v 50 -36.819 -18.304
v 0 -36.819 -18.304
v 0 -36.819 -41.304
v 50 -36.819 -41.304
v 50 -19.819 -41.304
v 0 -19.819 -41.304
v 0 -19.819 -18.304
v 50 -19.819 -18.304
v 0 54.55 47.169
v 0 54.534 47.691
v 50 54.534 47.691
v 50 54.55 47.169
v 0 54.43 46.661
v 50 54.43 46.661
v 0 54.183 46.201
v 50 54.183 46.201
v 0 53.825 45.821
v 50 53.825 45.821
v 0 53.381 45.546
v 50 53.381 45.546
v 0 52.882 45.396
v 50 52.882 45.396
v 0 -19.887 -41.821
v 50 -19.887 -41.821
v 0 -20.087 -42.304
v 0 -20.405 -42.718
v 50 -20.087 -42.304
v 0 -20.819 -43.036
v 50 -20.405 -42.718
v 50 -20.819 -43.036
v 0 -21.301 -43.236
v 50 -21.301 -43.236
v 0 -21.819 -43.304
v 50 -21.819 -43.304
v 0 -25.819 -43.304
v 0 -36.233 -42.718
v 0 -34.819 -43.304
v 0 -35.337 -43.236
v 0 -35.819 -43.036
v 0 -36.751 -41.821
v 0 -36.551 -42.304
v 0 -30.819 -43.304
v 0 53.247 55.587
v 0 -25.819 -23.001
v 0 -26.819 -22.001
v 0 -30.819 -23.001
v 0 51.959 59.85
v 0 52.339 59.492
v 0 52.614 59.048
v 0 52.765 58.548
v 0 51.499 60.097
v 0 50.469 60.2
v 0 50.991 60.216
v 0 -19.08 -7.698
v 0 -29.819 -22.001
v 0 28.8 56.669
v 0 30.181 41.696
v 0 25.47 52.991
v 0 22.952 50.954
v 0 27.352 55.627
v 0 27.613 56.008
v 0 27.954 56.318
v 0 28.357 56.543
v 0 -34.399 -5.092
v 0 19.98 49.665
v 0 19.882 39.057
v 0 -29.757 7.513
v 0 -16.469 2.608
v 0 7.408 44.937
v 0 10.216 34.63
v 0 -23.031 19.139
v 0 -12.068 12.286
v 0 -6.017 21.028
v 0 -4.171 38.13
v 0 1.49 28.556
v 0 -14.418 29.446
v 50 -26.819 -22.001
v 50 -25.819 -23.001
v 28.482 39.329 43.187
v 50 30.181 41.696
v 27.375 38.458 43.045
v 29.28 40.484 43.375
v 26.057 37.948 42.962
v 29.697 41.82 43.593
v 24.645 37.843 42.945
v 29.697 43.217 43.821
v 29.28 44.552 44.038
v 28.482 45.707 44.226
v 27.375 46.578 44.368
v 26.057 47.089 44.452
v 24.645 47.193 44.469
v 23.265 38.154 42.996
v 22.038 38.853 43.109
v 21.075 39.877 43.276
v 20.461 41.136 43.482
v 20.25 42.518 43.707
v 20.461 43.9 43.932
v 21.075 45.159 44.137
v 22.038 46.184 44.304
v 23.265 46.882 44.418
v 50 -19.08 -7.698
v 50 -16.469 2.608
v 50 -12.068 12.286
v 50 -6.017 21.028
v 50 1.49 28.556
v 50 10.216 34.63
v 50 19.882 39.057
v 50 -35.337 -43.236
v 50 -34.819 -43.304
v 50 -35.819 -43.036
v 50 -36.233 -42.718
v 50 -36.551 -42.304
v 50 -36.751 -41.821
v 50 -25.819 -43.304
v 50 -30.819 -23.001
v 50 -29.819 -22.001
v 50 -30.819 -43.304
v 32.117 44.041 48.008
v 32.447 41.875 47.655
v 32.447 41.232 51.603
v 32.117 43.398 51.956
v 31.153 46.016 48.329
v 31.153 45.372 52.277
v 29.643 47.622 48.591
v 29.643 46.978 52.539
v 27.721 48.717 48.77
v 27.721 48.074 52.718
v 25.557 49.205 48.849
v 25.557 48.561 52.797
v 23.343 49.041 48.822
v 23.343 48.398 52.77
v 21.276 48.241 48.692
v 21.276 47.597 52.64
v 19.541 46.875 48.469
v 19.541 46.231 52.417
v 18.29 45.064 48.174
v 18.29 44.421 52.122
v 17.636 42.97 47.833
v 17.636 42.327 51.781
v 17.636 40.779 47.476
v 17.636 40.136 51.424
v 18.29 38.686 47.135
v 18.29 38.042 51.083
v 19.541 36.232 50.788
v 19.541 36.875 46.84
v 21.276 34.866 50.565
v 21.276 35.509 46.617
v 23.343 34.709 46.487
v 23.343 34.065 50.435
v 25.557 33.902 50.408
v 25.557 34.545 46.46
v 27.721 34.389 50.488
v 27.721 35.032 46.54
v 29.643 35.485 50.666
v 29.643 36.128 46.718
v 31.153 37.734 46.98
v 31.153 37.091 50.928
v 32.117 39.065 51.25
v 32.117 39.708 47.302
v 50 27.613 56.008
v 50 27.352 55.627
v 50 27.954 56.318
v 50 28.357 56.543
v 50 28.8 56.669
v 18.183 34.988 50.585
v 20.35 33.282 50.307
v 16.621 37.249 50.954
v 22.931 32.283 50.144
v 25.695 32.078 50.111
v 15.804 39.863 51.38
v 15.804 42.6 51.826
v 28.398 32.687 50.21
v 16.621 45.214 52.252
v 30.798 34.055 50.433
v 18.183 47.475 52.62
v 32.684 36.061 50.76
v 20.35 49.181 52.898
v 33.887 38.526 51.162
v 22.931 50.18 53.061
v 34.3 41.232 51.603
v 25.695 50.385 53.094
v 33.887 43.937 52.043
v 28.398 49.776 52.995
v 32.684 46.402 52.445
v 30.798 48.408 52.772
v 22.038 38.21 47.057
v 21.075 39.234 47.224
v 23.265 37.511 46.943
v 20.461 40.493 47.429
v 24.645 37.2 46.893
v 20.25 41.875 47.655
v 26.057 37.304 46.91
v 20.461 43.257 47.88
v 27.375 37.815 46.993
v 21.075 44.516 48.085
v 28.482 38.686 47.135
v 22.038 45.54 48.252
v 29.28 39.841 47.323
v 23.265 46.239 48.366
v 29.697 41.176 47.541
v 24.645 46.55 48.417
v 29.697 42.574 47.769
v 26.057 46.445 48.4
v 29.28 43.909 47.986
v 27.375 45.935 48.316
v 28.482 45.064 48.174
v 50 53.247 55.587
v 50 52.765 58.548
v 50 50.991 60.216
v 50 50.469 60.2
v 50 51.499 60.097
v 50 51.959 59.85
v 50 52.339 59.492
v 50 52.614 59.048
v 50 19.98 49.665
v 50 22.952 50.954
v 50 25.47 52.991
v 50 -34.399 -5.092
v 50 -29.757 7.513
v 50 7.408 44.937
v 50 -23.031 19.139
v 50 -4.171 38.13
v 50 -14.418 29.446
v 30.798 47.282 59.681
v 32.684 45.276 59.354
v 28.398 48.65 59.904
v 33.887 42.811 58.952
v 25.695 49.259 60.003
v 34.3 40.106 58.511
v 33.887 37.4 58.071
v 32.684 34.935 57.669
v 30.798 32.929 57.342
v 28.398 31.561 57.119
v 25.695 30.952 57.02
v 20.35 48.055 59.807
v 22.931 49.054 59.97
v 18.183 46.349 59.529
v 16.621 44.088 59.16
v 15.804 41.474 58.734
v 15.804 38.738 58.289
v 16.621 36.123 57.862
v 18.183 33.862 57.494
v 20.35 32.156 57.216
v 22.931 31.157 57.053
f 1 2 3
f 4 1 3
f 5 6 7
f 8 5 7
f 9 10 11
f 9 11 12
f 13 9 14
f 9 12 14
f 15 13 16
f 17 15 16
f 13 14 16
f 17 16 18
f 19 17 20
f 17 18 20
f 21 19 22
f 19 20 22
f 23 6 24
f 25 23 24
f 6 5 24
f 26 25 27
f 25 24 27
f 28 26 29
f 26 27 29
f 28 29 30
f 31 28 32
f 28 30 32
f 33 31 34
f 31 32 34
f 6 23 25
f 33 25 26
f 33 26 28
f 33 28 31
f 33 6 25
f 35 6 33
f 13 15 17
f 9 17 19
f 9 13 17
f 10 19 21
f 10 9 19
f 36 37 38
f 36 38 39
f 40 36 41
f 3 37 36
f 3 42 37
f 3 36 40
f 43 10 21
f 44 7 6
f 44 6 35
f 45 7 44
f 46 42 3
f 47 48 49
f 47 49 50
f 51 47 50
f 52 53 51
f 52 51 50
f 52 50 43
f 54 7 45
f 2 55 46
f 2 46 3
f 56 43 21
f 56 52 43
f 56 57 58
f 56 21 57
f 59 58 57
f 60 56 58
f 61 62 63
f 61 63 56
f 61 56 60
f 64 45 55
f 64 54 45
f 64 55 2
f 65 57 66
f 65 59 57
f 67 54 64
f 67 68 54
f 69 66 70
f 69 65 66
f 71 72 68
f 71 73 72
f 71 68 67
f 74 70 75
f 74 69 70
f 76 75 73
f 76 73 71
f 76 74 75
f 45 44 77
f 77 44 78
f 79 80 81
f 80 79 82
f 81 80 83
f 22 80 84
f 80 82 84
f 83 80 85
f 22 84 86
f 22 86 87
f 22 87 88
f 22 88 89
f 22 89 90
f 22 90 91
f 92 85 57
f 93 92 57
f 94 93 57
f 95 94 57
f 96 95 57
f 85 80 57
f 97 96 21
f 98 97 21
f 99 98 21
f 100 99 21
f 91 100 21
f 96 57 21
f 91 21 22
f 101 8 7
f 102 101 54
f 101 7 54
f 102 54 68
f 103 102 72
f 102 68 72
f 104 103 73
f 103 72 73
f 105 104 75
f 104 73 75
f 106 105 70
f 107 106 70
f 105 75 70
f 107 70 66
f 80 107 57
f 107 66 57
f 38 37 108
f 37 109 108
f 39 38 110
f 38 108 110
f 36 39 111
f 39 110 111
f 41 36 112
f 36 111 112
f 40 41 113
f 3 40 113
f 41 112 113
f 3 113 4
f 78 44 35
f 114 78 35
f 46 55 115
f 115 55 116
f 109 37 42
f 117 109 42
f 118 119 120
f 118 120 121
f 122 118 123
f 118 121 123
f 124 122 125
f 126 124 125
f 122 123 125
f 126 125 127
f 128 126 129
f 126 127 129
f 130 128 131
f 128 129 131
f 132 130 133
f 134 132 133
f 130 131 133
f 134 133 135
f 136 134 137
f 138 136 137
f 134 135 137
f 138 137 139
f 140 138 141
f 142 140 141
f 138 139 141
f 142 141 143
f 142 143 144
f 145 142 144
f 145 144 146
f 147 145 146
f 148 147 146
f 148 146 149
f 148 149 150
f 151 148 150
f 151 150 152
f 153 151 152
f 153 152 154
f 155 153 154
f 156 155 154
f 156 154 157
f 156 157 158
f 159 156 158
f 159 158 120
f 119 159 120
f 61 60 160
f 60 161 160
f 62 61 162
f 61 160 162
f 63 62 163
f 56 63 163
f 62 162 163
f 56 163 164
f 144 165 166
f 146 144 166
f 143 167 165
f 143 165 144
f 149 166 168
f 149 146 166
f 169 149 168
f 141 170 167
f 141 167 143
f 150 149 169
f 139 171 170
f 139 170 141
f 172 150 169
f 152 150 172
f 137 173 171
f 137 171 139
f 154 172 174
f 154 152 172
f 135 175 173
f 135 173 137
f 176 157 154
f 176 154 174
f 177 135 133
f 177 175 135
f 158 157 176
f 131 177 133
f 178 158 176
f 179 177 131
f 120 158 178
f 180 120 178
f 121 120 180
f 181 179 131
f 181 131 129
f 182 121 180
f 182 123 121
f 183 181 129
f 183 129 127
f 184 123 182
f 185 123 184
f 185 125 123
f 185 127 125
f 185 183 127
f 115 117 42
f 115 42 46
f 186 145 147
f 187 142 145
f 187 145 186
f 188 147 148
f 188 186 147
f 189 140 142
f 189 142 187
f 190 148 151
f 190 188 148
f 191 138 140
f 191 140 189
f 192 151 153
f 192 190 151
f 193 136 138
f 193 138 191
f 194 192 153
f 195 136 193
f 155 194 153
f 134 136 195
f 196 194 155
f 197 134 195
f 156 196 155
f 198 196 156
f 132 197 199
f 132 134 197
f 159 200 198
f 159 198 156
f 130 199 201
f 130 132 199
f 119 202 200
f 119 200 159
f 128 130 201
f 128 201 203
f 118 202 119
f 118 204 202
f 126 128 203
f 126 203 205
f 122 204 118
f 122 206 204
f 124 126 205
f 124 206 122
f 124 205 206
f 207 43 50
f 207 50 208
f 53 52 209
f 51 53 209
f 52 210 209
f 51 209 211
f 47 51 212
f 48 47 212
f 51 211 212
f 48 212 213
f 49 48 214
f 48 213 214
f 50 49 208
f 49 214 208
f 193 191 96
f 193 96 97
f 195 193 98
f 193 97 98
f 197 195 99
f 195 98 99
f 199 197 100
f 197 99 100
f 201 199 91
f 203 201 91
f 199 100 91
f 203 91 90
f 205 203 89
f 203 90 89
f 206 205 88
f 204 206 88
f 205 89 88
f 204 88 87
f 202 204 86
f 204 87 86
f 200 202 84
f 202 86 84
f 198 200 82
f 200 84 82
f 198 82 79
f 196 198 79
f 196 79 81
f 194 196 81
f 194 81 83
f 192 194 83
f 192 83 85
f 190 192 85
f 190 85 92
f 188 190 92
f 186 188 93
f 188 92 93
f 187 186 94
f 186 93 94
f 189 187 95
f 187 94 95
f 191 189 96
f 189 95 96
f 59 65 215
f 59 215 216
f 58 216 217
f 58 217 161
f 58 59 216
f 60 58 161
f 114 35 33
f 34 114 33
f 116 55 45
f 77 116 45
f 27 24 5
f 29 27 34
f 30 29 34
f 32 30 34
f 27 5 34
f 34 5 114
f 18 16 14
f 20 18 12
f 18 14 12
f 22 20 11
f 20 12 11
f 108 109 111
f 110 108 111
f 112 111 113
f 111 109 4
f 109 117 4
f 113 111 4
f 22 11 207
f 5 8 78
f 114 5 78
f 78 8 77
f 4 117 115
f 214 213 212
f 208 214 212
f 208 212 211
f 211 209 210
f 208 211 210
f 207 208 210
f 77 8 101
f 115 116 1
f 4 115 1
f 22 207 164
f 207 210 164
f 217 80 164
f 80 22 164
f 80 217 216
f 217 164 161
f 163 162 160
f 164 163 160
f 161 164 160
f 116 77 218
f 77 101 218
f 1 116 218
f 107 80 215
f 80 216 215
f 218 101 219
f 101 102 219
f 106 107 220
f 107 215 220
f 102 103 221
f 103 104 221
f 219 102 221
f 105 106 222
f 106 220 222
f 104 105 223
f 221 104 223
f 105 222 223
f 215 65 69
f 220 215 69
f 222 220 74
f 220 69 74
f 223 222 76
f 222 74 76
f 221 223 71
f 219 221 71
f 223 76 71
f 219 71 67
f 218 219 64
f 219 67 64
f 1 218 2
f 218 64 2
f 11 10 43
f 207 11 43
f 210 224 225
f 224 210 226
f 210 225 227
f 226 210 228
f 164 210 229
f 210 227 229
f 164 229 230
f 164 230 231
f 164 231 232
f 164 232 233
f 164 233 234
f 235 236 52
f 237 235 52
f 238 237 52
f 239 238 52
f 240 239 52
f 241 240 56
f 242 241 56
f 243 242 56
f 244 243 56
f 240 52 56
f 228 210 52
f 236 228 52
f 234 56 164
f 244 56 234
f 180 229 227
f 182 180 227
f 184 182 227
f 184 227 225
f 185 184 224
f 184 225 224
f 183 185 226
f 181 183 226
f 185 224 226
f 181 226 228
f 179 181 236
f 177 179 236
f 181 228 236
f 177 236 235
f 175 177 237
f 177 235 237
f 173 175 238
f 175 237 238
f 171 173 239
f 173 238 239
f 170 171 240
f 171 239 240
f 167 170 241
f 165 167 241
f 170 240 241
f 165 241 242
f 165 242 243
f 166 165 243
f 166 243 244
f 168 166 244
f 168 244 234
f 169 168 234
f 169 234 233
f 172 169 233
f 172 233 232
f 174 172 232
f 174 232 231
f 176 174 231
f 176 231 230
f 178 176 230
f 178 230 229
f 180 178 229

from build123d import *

# Parameters (mm, degrees)
F1_DEPTH       = 50
F2_DEPTH       = 5
F4_D           = 9.5
F4_CBORE_D     = 18.6
F4_CBORE_DEPTH = 7
F5_T1_DEPTH    = 50
F6_R           = 2
F7_R           = 2
F8_R           = 2
F9_R           = 2
F10_R          = 2
F11_SIZE       = 1
F12_SIZE       = 1
F3_R           = 7.4475
F3_R_2         = 4.7406141581
F13_DEPTH      = 11


# Not quite as in the source:
# - a fillet or chamfer that OpenCascade refuses, or shapes differently, is made with other operations: its cross-section is extruded or revolved along the edge and cut away or added
# - a feature names something its author has since deleted; it is built from what else it names


with BuildPart() as f1:
    # F0 (on Right) → F1 (new body)
    with BuildSketch(Plane.YZ):
        with BuildLine():
            Line((-36.8190155774, -18.3037728071), (-36.8190155774, -43.3037728071))
            Line((-36.8190155774, -43.3037728071), (-30.8190155774, -43.3037728071))
            Line((-30.8190155774, -43.3037728071), (-30.8190155774, -22.0011100173))
            Line((-30.8190155774, -22.0011100173), (-25.8190155774, -22.0011100173))
            Line((-25.8190155774, -22.0011100173), (-25.8190155774, -43.3037728071))
            Line((-25.8190155774, -43.3037728071), (-19.8190155774, -43.3037728071))
            Line((-19.8190155774, -43.3037728071), (-19.8190155774, -18.3037728071))
            ThreePointArc((-19.8190155774, -18.3037728071), (-6.0172669539, 21.0281033399), (30.1809844226, 41.6962271929))
            Line((30.1809844226, 41.6962271929), (54.8554914248, 45.7172599205))
            Line((54.8554914248, 45.7172599205), (53.2470783337, 55.5870627214))
            Line((53.2470783337, 55.5870627214), (28.5725713315, 51.5660299938))
            ThreePointArc((28.5725713315, 51.5660299938), (-16.0298177258, 27.7745861378), (-36.8190155774, -18.3037728071))
        make_face()
    extrude(amount=F1_DEPTH)

    # F2 (add): a face of the model
    f2_faces = [f1.faces().sort_by_distance(p)[0] for p in [
        (25, 40.9098248326, 53.5765463576),
    ]]
    extrude(f2_faces, amount=F2_DEPTH)

    # F4 (through all)
    with Locations(Plane(origin=(0, -8.2509991118, 50.6311062727), x_dir=(1, 0, 0), z_dir=(0, -0.1608413091, 0.9869802801))):
        with Locations((25, 48.9945122253)):
            CounterBoreHole(F4_D / 2, F4_CBORE_D / 2, F4_CBORE_DEPTH)

    # F5: fillet of radius 12 on 1 edges, made by hand

    # F5_s2 → F5_t1 (join)
    with BuildSketch(Plane.YZ):
        with BuildLine():
            ThreePointArc((19.9803220456, 49.6650925191), (24.650251765, 52.1990228082), (27.768364786, 56.5009313942))
            Line((27.768364786, 56.5009313942), (28.5725713315, 51.5660299938))
            ThreePointArc((28.5725713315, 51.5660299938), (24.2497369804, 50.7362893045), (19.9803220456, 49.6650925191))
        make_face()
    extrude(amount=F5_T1_DEPTH)

    # F6
    f6_edges = [f1.edges().sort_by_distance(p)[0] for p in [
        (25, 27.768365, 56.500931),
    ]]
    fillet(f6_edges, radius=F6_R)

    # F7
    f7_edges = [f1.edges().sort_by_distance(p)[0] for p in [
        (25, 52.442872, 60.521964),
    ]]
    fillet(f7_edges, radius=F7_R)

    # F8
    f8_edges = [f1.edges().sort_by_distance(p)[0] for p in [
        (25, 54.855491, 45.71726),
    ]]
    fillet(f8_edges, radius=F8_R)

    # F9
    f9_edges = [f1.edges().sort_by_distance(p)[0] for p in [
        (25, -19.819016, -43.303773),
    ]]
    fillet(f9_edges, radius=F9_R)

    # F10
    f10_edges = [f1.edges().sort_by_distance(p)[0] for p in [
        (25, -36.819016, -43.303773),
    ]]
    fillet(f10_edges, radius=F10_R)

    # F11
    f11_edges = [f1.edges().sort_by_distance(p)[0] for p in [
        (25, -30.819016, -22.00111),
    ]]
    chamfer(f11_edges, length=F11_SIZE)

    # F12
    f12_edges = [f1.edges().sort_by_distance(p)[0] for p in [
        (25, -25.819016, -22.00111),
    ]]
    chamfer(f12_edges, length=F12_SIZE)

    # F3 (on face) → F13 (cut)
    with BuildSketch(Plane(origin=(0, -8.2509991118, 50.6311062727), x_dir=(1, 0, 0), z_dir=(0, -0.1608413091, 0.9869802801))):
        with Locations((25, 48.9945122253)):
            Circle(F3_R)
        with Locations((25, 48.9945122253)):
            Circle(F3_R_2, mode=Mode.SUBTRACT)
    extrude(amount=-F13_DEPTH, mode=Mode.SUBTRACT)


solid = f1.part
